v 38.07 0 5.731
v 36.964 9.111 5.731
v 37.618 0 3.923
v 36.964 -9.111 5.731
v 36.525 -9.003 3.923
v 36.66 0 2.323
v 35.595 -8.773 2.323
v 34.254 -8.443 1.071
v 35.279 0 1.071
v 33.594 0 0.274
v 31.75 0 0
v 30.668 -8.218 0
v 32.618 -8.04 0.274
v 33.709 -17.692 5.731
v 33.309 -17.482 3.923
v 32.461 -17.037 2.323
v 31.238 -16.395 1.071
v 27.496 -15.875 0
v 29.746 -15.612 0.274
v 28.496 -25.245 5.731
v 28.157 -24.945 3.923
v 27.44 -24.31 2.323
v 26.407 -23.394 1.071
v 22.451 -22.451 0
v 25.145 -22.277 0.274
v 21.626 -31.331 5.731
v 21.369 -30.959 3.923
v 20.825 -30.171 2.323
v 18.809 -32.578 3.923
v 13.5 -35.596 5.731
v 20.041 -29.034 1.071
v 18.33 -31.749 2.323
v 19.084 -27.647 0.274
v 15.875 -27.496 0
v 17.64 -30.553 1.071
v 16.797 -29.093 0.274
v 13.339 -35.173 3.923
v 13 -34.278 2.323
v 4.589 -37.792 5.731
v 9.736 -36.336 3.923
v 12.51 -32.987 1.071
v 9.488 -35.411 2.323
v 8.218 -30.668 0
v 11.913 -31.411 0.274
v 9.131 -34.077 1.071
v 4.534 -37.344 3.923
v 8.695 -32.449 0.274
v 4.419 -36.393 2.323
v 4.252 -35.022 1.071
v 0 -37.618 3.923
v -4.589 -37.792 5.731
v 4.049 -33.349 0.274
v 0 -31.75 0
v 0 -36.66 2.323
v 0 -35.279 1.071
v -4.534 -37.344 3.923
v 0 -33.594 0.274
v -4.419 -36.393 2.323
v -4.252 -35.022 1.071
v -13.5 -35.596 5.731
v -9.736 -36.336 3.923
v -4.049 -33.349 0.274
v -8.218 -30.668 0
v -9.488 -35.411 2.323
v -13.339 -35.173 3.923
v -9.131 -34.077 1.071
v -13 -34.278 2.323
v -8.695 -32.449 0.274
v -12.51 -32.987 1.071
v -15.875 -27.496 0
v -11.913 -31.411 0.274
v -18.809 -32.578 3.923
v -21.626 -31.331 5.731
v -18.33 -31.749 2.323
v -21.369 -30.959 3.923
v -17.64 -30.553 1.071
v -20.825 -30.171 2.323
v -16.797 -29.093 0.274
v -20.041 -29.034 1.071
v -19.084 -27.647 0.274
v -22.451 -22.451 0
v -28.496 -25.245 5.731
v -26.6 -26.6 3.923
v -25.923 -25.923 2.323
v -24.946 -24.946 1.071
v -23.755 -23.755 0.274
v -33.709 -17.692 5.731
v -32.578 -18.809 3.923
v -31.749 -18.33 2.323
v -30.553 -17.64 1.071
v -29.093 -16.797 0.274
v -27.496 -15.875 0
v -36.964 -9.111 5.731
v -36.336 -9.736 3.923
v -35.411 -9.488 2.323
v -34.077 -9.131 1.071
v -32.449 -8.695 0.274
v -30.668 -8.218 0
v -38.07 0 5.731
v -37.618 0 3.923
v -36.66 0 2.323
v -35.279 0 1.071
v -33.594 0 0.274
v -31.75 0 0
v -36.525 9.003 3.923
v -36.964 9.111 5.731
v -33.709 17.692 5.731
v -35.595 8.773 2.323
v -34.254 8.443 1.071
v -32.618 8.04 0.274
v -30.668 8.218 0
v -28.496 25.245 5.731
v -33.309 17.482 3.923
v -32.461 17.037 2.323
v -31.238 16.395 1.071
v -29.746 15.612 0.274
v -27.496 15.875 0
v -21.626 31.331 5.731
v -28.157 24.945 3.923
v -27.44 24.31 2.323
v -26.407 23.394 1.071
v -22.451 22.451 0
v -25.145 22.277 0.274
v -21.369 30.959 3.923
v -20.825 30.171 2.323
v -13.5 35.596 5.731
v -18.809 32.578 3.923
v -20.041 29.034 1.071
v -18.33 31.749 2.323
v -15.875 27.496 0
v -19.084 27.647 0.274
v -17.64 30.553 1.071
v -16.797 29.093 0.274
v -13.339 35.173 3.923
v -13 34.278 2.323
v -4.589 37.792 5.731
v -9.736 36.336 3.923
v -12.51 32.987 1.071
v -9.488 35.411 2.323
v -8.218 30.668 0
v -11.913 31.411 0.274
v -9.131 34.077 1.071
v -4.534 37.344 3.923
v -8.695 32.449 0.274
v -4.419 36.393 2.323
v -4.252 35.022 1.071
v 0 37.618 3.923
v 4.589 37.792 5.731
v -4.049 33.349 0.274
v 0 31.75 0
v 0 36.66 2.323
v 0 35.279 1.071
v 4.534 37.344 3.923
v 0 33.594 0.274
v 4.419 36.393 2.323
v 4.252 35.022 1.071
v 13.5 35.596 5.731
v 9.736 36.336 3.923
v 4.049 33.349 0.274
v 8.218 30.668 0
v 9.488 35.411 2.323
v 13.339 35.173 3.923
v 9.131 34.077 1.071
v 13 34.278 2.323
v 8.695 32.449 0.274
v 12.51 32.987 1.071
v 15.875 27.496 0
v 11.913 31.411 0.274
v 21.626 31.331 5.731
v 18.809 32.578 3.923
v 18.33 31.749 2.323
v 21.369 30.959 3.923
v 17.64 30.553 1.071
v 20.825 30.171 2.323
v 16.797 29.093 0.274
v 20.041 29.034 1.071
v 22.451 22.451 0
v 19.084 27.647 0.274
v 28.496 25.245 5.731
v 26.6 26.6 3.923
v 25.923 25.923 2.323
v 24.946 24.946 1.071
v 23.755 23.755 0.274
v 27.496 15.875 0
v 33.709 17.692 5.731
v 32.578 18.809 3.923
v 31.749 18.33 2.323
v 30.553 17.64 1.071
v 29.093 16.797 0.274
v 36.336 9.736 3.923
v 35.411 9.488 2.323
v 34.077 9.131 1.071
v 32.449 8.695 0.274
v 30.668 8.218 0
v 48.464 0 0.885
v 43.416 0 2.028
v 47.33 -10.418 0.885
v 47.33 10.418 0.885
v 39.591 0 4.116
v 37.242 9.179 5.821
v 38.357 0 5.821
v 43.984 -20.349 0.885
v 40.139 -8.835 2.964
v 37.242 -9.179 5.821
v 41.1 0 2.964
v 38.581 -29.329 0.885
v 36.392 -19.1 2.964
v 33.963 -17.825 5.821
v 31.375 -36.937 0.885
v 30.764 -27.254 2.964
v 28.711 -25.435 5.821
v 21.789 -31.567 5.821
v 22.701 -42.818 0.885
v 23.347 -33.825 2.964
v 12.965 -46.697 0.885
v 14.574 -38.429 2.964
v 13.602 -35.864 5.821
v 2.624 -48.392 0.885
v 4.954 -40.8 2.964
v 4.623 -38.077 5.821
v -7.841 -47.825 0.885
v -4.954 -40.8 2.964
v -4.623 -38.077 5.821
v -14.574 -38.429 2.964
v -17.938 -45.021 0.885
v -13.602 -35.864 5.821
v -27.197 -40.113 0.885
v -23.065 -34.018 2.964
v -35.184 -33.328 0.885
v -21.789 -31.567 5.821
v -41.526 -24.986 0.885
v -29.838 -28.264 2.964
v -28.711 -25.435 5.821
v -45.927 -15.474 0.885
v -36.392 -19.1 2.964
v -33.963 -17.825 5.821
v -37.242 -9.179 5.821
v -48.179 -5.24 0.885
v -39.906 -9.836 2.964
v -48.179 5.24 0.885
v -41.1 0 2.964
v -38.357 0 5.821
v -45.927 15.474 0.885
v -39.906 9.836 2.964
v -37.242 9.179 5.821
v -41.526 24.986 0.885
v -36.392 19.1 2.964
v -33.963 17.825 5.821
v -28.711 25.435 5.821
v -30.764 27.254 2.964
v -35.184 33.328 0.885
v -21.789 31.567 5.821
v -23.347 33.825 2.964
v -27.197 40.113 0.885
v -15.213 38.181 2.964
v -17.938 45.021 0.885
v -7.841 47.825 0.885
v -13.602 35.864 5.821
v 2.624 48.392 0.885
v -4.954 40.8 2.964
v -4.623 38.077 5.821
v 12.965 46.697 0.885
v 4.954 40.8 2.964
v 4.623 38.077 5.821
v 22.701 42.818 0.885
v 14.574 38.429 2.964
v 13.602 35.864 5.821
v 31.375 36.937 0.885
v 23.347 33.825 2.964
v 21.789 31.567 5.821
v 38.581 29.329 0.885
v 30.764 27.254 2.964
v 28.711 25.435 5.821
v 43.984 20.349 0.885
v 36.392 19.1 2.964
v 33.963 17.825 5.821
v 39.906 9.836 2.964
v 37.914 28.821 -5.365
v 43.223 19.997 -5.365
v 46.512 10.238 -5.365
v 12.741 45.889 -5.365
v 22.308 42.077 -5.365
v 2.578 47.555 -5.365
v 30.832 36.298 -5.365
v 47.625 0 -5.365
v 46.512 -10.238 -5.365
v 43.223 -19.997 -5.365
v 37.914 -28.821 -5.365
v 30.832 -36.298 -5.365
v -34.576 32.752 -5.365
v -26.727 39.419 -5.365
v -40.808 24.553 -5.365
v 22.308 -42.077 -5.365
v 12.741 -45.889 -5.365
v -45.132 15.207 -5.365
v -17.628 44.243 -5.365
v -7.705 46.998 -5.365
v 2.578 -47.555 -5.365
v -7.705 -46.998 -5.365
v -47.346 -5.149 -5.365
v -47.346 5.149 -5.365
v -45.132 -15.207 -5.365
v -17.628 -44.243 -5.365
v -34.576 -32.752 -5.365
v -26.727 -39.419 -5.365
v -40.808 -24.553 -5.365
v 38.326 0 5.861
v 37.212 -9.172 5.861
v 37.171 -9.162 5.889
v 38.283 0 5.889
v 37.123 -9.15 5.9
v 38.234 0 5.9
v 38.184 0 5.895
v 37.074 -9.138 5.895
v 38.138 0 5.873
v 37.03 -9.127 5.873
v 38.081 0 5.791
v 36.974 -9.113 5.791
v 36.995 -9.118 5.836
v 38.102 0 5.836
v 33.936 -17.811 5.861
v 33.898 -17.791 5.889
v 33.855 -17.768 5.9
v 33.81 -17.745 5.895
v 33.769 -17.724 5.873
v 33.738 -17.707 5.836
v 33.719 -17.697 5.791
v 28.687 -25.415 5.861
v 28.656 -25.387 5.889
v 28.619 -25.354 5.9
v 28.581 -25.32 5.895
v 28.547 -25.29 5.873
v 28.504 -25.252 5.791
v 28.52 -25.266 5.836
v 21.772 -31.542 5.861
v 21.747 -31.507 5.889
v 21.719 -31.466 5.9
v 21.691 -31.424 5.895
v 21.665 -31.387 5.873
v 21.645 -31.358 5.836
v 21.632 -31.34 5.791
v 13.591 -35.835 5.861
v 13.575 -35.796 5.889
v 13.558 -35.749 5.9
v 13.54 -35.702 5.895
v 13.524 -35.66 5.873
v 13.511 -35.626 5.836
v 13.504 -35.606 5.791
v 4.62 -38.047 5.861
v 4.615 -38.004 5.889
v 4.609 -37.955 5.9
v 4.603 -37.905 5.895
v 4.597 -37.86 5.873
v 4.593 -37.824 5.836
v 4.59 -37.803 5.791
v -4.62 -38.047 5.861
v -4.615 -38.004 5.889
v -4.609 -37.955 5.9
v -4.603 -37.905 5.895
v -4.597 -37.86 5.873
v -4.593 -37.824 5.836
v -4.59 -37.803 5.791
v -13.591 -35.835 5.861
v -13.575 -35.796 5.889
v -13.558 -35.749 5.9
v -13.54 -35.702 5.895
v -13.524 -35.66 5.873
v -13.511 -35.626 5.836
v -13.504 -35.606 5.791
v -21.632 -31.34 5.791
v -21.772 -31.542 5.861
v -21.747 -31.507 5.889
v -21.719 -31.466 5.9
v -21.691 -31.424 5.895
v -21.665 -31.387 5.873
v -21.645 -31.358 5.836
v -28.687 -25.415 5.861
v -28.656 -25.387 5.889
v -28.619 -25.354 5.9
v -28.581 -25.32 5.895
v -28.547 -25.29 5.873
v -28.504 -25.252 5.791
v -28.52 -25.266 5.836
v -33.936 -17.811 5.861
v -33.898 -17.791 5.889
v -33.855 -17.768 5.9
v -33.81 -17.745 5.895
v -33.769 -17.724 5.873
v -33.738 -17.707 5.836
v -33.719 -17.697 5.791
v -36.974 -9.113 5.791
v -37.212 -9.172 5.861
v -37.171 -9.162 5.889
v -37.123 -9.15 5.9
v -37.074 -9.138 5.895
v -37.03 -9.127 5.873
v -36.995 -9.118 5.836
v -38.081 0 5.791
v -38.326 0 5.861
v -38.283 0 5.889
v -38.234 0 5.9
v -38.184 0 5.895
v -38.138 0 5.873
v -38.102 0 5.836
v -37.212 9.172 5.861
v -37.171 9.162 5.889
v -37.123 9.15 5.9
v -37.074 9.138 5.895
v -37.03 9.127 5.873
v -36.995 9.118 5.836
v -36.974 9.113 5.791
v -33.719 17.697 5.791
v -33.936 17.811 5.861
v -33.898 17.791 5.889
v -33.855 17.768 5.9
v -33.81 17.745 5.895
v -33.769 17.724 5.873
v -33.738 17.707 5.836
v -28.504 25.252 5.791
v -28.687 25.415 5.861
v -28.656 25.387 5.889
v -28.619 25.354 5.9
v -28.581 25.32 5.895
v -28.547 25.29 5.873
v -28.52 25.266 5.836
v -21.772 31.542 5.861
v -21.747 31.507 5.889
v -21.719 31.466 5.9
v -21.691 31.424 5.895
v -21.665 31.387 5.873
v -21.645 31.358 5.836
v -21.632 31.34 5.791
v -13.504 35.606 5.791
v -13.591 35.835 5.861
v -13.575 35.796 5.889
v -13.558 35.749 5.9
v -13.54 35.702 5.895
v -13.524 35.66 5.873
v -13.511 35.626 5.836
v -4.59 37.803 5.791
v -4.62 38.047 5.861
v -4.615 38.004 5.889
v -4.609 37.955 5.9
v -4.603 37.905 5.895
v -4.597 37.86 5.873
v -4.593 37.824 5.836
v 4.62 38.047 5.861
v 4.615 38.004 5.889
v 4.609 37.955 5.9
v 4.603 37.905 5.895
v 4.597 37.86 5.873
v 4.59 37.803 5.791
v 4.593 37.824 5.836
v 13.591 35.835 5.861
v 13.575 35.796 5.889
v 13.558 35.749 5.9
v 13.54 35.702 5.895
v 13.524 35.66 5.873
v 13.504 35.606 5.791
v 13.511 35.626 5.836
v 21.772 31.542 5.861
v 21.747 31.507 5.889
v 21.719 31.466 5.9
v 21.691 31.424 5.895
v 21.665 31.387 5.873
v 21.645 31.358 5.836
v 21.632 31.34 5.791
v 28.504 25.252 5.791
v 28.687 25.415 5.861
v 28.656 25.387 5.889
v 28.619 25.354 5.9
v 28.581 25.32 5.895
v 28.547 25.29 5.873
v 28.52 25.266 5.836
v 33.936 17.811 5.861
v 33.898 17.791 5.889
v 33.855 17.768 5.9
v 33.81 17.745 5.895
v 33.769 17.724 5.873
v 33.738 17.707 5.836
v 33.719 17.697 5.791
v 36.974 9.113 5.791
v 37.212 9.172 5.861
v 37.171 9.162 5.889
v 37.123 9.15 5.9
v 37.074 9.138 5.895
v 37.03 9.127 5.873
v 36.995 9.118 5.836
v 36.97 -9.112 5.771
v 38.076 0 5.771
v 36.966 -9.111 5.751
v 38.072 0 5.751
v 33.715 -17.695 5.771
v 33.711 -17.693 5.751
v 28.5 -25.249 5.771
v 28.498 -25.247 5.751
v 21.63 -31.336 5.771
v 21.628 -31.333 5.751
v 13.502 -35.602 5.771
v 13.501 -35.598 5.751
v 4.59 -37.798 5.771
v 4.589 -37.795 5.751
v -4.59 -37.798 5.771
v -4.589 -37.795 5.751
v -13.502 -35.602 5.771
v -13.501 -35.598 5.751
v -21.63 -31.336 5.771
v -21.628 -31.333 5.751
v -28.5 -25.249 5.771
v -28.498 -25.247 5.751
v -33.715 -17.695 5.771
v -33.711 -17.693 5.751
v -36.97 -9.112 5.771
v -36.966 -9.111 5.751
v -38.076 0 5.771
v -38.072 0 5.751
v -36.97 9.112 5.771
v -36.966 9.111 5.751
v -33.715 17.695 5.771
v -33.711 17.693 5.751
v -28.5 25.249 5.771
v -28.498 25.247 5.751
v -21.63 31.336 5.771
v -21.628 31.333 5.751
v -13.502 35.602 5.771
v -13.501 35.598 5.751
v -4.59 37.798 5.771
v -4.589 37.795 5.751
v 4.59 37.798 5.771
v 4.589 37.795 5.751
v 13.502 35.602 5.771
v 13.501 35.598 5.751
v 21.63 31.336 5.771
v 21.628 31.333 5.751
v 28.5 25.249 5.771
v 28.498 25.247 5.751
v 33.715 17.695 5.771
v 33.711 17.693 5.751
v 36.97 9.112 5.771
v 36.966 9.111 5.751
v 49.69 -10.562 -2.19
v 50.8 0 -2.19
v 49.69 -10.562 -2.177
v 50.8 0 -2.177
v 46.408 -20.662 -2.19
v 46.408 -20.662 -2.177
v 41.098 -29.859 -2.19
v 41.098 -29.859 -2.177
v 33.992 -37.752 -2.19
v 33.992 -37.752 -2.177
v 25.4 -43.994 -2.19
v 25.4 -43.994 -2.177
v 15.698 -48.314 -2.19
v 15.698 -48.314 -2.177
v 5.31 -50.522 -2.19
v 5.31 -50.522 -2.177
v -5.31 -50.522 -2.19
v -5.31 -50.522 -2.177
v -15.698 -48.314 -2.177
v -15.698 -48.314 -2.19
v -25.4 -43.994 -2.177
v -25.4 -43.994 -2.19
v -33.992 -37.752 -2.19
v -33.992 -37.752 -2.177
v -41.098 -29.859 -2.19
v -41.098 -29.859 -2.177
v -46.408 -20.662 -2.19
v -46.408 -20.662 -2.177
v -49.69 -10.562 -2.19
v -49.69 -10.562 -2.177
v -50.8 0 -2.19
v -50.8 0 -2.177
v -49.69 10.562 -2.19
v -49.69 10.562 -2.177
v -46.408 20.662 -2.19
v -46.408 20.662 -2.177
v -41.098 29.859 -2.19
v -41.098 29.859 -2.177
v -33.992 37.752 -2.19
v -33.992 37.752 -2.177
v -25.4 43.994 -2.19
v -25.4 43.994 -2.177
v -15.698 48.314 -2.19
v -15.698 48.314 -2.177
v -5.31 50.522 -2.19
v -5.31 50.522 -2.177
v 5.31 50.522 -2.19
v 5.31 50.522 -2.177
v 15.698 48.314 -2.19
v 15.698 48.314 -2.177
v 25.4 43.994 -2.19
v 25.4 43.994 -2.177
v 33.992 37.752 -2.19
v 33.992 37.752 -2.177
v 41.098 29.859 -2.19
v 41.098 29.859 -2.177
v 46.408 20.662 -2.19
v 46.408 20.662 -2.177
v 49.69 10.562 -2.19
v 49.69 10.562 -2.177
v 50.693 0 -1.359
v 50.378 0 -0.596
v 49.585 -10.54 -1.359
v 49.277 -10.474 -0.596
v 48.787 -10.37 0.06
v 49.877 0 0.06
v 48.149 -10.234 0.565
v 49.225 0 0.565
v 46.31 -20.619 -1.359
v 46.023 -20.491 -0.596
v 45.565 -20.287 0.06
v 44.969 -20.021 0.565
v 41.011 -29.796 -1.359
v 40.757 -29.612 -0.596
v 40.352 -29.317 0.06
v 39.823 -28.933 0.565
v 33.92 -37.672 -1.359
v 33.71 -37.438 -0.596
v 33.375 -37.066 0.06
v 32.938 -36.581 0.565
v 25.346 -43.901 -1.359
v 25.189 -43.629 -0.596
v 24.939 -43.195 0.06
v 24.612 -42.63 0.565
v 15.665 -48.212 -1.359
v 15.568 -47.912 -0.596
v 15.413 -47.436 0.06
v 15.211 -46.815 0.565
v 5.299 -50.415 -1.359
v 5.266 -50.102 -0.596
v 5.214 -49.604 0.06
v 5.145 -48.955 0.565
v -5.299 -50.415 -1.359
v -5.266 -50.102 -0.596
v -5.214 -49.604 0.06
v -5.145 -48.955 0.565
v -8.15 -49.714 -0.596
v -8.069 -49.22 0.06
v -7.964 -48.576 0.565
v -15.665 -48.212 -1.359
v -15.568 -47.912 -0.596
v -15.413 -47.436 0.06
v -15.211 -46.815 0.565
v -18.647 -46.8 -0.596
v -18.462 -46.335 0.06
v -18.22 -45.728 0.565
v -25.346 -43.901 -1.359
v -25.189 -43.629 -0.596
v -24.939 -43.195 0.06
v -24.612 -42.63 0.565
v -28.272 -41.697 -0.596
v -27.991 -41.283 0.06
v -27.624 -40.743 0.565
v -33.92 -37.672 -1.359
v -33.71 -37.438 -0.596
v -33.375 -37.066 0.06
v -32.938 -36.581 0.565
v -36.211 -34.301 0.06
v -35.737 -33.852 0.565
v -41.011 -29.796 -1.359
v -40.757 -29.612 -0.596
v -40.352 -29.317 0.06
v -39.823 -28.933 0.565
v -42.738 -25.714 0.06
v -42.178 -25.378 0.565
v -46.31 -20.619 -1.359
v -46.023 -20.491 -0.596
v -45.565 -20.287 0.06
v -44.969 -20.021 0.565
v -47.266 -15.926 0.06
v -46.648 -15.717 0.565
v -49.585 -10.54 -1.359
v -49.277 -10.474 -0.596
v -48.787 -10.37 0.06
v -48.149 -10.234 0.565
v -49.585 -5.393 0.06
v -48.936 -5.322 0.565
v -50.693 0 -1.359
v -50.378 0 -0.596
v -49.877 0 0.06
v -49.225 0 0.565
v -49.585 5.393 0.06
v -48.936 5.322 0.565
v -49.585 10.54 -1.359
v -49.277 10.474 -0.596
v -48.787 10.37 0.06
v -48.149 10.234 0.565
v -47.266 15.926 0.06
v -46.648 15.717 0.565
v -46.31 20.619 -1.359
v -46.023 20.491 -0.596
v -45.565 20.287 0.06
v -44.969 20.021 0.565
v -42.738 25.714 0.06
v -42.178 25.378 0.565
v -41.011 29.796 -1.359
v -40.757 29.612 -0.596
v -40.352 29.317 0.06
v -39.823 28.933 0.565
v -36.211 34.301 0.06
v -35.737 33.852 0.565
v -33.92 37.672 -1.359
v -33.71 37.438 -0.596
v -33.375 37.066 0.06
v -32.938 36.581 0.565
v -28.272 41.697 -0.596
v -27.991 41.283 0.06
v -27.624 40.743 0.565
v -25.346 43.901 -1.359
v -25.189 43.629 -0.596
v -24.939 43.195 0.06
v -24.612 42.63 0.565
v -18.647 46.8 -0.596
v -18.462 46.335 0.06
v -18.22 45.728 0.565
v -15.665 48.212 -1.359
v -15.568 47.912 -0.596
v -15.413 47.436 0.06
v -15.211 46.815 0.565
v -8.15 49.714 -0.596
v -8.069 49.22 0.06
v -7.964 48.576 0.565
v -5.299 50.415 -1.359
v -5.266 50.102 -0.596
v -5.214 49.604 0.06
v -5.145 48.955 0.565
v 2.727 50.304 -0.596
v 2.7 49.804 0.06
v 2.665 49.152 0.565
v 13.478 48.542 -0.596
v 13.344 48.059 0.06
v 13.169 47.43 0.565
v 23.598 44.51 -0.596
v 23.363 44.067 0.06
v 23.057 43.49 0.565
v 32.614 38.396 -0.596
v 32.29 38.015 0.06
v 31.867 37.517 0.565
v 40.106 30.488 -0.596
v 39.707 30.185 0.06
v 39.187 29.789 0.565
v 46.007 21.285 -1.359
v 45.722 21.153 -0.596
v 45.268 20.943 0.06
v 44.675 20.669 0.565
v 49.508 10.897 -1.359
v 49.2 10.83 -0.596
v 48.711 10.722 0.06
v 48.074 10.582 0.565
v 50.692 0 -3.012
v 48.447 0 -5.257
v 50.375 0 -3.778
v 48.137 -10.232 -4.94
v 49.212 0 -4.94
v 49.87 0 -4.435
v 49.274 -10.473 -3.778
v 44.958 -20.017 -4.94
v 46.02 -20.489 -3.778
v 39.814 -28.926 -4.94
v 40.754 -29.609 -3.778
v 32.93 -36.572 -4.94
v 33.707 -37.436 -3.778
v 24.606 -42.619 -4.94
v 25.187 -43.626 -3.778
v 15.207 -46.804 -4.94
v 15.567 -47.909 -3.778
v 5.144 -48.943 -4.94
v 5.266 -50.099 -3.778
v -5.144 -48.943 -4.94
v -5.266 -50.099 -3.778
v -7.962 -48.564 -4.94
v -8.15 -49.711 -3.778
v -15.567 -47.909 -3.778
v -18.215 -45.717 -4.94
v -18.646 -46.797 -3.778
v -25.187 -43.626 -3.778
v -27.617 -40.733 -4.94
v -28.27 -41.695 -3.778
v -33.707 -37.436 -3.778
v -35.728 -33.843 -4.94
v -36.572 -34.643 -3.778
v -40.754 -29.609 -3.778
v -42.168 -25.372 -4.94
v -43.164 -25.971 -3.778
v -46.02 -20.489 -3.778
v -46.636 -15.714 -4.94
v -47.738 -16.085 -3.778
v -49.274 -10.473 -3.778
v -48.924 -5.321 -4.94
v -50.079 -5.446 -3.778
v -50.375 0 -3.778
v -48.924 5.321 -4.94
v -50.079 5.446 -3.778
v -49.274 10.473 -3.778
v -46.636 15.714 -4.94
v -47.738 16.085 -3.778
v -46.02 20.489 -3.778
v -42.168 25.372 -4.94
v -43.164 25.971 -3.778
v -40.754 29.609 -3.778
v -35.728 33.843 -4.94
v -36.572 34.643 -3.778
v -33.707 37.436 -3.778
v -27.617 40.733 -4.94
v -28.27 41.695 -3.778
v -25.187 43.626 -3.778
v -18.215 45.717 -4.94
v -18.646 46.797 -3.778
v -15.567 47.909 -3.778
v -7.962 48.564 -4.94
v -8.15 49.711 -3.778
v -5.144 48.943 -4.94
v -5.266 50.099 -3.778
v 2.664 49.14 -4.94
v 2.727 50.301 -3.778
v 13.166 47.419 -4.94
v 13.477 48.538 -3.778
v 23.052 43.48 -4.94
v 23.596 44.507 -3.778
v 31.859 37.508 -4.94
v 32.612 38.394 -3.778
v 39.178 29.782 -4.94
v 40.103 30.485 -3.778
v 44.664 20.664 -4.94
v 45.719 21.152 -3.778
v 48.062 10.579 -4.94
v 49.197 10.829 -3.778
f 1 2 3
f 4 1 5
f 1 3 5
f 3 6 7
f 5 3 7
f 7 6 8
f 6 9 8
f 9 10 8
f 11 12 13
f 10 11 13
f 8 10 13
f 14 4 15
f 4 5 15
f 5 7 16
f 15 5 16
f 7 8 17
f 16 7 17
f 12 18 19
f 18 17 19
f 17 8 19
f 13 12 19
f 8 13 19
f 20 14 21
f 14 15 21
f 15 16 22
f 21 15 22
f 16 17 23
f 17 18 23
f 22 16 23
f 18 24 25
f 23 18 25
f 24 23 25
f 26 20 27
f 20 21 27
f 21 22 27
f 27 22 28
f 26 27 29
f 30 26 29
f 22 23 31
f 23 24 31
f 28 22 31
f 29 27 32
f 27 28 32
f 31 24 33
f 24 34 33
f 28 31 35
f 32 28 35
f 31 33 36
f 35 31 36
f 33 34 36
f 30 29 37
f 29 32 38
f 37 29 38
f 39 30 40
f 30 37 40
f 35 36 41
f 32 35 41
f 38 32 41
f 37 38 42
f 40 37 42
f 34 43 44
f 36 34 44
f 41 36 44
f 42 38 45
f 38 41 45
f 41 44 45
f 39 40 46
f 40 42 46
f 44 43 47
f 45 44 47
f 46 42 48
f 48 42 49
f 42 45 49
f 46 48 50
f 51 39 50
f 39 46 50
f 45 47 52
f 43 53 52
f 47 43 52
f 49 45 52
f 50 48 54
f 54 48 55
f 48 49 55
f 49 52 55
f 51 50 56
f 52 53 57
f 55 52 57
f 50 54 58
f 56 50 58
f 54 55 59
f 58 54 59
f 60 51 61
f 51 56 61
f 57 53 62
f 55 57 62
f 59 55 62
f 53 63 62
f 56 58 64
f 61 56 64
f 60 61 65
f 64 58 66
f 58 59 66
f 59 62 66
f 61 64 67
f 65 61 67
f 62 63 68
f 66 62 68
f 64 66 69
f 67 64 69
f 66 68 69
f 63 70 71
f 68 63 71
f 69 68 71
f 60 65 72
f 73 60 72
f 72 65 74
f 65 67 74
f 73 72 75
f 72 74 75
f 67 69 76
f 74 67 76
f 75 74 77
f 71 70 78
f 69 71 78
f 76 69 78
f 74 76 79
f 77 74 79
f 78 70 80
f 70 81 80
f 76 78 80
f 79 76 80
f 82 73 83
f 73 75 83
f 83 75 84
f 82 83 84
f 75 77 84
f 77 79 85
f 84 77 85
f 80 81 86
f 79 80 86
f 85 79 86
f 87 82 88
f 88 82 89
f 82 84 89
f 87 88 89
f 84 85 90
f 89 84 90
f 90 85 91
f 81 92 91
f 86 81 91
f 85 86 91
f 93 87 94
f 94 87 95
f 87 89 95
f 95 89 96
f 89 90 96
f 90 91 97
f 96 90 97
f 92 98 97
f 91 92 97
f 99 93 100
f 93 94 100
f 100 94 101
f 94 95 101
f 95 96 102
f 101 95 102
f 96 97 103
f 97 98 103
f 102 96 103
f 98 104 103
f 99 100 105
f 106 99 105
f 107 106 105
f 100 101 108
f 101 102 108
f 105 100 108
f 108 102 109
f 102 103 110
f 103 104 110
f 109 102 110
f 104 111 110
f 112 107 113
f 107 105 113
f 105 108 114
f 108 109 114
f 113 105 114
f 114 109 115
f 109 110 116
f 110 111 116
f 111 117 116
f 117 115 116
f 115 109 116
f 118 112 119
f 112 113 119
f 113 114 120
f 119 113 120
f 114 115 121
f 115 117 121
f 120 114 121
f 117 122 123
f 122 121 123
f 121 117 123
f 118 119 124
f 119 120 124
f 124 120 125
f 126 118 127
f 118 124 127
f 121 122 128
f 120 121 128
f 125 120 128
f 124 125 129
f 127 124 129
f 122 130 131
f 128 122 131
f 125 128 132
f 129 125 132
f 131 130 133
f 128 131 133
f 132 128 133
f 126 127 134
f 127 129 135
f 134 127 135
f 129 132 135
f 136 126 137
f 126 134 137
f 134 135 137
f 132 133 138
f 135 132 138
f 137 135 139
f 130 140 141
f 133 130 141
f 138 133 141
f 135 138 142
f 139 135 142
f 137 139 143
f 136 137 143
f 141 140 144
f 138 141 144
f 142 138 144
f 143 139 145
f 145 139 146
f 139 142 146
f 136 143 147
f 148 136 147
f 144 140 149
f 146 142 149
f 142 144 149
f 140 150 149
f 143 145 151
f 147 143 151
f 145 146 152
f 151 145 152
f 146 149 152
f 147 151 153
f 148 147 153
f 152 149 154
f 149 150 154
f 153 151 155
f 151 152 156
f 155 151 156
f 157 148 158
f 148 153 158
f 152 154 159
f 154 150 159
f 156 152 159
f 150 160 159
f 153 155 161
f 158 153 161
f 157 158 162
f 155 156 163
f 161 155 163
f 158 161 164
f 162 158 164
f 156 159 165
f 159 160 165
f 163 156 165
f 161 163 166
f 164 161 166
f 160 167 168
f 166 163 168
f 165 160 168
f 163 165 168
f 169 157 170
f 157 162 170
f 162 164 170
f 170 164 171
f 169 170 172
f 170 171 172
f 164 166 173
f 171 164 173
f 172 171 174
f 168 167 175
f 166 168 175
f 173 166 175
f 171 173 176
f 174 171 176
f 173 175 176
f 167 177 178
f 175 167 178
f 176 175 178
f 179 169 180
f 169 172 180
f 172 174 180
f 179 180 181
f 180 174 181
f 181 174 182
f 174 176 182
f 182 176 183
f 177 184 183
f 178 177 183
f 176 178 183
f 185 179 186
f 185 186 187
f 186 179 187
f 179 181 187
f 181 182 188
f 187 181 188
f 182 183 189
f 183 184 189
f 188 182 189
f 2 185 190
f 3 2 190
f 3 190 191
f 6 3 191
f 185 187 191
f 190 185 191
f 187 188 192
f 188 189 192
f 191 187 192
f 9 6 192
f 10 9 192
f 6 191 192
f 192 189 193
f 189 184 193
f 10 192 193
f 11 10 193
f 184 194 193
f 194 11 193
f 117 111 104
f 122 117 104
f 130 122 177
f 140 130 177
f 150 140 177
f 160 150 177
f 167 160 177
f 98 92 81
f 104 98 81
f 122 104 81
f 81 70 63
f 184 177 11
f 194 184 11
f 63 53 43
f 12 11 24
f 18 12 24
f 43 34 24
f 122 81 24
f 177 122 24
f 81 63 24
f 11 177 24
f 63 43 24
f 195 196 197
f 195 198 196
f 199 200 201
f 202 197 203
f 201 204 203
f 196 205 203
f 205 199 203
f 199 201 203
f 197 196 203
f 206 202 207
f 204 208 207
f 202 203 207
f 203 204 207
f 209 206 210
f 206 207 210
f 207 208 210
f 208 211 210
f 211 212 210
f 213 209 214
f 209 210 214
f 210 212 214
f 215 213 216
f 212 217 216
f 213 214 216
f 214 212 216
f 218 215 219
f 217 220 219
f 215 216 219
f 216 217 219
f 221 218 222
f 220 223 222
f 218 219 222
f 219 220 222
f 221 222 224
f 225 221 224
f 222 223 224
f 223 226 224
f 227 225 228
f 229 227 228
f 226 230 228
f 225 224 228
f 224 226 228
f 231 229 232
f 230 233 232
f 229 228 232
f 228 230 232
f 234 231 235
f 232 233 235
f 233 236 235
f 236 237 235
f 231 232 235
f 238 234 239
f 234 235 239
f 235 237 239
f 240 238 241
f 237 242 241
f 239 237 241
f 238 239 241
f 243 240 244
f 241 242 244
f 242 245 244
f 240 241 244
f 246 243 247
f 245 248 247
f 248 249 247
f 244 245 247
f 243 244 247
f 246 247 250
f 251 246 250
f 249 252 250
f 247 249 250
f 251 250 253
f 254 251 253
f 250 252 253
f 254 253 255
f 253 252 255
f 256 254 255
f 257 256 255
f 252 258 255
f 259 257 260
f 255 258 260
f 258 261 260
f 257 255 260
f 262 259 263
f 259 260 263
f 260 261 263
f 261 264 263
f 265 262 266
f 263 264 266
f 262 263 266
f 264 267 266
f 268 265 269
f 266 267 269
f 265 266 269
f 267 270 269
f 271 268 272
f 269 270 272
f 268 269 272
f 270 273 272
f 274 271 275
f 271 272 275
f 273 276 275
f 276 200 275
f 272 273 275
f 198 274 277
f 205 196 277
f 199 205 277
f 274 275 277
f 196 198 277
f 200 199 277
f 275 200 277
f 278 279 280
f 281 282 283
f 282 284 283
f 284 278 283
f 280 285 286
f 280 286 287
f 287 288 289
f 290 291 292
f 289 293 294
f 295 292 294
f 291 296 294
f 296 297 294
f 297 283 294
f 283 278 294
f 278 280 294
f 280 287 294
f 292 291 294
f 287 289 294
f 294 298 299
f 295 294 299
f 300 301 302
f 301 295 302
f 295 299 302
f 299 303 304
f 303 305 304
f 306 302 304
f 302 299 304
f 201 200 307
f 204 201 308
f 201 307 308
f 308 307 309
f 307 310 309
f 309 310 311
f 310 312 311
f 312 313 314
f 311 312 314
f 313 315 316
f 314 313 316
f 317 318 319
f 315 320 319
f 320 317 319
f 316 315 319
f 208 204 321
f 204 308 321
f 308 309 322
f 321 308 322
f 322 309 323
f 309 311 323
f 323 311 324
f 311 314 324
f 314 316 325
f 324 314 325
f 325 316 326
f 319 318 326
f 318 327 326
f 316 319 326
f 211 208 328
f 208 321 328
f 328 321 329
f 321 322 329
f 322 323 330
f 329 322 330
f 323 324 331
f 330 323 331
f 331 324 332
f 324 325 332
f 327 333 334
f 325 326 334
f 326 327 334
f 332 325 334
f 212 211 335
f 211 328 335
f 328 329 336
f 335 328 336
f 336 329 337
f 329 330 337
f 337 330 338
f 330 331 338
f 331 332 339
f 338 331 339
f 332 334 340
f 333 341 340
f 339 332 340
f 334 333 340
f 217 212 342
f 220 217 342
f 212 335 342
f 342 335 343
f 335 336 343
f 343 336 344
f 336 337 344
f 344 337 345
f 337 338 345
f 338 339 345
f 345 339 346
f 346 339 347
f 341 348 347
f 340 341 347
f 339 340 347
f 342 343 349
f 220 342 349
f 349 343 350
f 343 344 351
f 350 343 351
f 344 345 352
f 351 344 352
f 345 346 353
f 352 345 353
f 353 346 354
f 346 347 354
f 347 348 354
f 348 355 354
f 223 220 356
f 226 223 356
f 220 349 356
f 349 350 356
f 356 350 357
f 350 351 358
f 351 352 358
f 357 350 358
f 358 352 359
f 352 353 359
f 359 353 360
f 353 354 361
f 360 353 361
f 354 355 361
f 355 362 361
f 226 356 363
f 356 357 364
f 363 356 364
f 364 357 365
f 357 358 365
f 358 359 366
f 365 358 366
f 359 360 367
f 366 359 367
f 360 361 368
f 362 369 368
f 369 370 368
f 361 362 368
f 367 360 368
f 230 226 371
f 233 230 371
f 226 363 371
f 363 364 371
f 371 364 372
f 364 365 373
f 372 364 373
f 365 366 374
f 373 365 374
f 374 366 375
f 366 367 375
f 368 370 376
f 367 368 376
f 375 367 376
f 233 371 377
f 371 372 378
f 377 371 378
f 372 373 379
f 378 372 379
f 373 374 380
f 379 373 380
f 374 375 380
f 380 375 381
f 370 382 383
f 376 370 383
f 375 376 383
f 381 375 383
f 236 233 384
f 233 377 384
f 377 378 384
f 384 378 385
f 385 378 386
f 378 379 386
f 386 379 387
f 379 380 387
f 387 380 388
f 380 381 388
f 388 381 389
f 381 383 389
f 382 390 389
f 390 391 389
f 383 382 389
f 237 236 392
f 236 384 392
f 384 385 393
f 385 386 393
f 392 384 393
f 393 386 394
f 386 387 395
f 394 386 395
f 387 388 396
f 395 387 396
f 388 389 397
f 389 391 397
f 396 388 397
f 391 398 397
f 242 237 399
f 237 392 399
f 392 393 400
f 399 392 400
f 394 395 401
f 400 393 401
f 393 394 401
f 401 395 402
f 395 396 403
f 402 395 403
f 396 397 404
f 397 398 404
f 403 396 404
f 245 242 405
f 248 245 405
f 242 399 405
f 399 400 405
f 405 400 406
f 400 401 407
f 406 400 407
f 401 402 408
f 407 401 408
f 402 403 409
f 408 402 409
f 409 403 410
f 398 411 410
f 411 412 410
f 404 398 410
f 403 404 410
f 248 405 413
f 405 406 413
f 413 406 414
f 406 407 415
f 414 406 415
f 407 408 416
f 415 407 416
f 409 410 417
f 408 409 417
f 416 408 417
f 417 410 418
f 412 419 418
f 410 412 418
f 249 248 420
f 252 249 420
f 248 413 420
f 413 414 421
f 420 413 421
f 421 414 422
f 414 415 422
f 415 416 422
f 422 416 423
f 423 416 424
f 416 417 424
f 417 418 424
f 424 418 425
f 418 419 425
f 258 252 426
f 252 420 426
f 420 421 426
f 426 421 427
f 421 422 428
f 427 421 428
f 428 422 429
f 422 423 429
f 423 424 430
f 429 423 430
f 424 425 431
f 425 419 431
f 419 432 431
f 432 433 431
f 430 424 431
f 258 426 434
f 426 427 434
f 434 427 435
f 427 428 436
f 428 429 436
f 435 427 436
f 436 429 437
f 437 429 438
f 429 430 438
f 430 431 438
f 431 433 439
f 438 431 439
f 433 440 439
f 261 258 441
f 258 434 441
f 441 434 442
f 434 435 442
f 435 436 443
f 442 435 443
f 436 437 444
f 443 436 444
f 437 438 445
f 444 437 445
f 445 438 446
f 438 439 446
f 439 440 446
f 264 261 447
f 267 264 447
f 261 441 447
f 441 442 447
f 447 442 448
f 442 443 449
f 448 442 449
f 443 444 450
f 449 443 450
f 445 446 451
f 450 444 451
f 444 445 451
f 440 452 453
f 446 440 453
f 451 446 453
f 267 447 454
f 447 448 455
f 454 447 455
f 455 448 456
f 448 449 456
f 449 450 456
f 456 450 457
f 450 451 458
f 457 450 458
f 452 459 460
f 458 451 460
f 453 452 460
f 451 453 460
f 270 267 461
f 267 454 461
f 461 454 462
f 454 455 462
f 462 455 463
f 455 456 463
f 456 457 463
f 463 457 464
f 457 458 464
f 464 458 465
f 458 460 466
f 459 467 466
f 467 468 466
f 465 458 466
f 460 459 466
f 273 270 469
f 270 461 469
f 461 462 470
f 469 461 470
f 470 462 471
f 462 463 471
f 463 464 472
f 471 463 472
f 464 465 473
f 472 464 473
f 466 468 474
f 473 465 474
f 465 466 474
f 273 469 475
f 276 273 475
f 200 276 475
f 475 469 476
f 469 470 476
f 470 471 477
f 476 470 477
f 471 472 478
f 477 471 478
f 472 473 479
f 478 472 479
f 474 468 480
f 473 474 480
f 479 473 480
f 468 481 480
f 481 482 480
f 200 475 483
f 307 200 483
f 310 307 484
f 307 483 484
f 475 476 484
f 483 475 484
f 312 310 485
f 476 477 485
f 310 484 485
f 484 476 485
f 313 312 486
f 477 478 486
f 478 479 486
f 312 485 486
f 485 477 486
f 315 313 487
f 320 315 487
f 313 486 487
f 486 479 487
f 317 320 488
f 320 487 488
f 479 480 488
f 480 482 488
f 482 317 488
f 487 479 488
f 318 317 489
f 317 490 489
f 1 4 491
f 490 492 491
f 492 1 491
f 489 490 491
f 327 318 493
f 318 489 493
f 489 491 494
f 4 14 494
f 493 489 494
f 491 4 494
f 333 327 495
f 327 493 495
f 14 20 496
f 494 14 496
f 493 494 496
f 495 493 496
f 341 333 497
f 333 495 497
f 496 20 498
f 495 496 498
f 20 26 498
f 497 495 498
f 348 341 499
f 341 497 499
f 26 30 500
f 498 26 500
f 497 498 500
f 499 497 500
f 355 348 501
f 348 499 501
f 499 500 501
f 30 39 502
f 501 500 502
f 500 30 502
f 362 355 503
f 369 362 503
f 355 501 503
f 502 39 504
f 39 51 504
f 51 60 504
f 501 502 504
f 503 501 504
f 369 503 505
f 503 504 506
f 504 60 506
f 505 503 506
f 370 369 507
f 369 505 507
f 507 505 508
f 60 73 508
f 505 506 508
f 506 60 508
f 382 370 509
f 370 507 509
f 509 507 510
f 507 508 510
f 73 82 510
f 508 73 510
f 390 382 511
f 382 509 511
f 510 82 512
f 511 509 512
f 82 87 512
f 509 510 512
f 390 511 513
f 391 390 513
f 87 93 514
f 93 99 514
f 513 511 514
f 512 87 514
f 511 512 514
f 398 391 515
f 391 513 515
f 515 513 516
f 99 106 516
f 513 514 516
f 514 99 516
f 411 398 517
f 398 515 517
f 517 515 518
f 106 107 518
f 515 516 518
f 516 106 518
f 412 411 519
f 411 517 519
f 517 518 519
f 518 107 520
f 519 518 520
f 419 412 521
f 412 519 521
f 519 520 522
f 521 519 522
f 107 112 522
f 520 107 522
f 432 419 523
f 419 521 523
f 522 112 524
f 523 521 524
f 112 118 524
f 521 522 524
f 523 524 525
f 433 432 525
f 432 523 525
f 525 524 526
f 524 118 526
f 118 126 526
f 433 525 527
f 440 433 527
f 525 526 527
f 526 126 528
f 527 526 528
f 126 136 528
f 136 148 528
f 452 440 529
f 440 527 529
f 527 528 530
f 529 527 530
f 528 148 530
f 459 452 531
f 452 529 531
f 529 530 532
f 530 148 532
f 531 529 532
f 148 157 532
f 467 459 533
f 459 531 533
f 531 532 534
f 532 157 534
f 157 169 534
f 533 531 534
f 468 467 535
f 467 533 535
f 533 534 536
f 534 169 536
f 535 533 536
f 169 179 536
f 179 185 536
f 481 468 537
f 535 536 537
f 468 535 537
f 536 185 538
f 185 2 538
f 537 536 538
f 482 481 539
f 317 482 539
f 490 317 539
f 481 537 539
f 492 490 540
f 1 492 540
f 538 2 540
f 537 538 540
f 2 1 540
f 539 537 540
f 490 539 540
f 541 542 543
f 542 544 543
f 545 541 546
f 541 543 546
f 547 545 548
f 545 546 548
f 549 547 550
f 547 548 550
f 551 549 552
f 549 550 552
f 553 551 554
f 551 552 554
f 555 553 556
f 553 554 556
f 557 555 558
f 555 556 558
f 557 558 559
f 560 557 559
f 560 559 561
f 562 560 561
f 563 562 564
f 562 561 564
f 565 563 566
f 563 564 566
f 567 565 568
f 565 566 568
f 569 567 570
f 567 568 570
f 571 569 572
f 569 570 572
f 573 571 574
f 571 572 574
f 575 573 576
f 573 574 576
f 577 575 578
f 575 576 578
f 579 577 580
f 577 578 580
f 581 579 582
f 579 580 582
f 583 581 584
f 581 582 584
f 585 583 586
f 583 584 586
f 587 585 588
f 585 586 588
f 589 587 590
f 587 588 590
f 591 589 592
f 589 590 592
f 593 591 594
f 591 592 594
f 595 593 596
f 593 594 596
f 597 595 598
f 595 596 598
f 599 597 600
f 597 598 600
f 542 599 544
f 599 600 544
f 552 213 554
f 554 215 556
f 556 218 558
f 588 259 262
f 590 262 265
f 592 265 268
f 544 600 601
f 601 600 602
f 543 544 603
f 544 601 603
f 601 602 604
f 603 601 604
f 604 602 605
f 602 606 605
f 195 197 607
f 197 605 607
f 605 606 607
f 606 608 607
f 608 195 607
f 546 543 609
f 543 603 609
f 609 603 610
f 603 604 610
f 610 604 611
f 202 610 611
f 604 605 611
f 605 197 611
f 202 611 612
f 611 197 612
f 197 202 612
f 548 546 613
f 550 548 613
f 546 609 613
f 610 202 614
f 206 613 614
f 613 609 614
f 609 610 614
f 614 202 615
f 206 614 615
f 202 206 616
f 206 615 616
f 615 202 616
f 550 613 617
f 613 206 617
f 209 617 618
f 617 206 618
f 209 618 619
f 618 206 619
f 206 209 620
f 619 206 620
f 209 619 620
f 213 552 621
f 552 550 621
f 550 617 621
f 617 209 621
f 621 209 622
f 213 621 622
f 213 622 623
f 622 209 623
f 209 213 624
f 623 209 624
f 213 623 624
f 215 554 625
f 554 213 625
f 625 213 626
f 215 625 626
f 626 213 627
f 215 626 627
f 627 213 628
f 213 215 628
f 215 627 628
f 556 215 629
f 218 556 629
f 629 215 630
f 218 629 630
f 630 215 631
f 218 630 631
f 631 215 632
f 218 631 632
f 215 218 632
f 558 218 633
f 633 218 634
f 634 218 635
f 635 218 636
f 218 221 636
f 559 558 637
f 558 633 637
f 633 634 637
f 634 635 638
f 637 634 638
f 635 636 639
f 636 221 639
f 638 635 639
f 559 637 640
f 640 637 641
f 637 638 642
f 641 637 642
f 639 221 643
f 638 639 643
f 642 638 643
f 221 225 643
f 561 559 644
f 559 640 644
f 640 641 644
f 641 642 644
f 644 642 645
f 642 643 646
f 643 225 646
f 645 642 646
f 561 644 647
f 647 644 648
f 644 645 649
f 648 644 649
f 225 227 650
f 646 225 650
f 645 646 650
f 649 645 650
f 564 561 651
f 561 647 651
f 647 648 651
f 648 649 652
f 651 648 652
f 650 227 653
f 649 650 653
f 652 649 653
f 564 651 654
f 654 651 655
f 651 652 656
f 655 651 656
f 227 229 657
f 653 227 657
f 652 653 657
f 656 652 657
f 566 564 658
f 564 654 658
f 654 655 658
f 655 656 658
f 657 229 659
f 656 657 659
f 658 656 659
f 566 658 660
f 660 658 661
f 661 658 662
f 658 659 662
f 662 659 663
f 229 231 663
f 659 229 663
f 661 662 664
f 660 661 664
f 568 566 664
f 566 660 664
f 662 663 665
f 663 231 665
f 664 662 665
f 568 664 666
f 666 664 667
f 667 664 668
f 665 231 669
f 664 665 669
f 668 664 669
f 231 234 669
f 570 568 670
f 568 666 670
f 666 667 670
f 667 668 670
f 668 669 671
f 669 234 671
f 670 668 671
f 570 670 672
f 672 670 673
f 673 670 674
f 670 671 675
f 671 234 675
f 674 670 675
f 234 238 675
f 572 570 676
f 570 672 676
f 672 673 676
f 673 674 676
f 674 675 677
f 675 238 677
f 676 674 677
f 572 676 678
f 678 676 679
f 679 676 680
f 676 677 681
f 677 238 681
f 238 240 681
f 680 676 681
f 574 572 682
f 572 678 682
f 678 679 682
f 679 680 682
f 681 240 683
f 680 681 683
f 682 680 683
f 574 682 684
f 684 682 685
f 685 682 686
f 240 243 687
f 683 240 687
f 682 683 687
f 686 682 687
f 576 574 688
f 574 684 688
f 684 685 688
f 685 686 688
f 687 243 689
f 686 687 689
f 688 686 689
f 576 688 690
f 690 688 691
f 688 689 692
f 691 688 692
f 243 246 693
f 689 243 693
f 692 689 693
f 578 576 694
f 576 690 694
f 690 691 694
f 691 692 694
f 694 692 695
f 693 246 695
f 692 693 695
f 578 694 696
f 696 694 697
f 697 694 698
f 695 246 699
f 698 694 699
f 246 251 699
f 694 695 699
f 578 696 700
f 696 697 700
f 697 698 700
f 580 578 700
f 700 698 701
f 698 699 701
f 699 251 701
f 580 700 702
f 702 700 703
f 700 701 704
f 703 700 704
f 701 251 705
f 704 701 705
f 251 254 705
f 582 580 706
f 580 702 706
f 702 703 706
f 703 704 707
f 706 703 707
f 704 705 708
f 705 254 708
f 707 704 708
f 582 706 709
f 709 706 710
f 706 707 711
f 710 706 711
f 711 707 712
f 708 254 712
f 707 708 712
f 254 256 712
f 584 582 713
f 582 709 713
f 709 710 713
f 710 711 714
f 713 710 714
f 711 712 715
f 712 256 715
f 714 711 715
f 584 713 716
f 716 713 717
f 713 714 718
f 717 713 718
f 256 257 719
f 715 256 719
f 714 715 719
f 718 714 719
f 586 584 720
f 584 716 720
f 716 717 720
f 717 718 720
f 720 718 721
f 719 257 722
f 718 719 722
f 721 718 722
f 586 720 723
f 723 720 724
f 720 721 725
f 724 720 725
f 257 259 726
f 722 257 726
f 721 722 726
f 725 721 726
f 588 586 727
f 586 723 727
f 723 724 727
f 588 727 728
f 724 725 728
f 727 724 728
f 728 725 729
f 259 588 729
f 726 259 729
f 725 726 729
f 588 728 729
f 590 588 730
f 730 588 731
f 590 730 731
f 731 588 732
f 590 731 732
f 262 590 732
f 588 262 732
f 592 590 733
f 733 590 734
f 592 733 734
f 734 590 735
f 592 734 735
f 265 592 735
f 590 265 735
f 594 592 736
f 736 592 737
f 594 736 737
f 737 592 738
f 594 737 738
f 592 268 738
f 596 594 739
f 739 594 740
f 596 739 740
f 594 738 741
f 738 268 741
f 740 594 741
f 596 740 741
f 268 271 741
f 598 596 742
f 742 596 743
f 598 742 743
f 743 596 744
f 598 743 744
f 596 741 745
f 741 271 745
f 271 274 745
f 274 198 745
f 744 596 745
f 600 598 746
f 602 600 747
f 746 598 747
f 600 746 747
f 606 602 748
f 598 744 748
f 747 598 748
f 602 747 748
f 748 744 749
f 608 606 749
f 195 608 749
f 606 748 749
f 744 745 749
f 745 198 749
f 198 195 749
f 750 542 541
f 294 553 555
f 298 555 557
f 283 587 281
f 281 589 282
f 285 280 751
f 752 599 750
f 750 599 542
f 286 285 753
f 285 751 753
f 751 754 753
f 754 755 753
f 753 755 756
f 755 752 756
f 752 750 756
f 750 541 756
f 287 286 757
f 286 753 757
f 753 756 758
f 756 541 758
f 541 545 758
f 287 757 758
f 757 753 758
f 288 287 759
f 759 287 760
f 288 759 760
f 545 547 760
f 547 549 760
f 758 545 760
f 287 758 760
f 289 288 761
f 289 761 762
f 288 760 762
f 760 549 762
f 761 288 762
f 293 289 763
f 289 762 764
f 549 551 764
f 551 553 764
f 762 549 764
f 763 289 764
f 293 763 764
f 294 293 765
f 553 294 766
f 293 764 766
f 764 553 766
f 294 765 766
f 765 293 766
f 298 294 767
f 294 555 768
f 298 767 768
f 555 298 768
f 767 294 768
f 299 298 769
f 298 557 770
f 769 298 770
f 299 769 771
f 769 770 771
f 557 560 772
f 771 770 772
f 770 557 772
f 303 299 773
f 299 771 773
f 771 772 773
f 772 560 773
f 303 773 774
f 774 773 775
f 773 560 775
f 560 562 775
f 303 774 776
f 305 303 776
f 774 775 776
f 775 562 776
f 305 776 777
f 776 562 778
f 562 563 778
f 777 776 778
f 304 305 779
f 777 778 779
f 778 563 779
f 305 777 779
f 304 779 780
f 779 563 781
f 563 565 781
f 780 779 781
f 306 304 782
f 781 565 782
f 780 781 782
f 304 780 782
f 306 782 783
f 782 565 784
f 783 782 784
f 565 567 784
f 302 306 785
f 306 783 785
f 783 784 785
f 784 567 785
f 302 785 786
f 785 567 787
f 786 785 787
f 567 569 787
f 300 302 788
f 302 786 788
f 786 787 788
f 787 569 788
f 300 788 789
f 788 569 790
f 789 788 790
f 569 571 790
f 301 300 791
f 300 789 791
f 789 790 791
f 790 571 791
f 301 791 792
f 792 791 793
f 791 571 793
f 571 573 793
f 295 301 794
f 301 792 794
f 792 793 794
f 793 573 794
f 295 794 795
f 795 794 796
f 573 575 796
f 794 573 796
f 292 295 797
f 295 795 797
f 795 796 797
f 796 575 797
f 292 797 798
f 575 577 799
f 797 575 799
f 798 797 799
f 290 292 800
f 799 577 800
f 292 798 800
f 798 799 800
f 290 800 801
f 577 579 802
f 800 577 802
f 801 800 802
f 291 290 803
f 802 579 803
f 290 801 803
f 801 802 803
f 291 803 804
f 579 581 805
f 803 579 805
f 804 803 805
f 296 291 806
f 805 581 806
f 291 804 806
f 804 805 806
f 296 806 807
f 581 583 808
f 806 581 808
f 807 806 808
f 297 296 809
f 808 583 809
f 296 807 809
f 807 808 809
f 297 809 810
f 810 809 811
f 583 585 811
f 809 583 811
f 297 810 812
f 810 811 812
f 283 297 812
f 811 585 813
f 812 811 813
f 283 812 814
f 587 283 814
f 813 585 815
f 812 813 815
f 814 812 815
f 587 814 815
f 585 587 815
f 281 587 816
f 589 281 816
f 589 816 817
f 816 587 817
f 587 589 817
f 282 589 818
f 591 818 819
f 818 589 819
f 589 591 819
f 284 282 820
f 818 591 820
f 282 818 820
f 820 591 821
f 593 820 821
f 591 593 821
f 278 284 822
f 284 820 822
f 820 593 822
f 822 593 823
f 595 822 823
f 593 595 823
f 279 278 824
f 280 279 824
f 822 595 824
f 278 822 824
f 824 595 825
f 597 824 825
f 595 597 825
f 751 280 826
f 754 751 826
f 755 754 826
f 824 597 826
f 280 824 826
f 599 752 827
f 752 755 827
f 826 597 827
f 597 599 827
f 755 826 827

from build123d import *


with BuildPart() as f2:
    # F1 (on Front) → F2 (revolve)
    with BuildSketch(Plane.XZ):
        with BuildLine():
            ThreePointArc((38.069789, 5.731313), (36.015785, 1.646216), (31.75, 0))
            Line((31.75, 0), (0, 0))
            Line((0, 0), (0, -5.365094))
            Line((0, -5.365094), (47.625, -5.365094))
            ThreePointArc((47.625, -5.365094), (49.870064, -4.435158), (50.8, -2.190094))
            Line((50.8, -2.190094), (50.8, -2.177424))
            ThreePointArc((50.8, -2.177424), (50.14917, -0.251498), (48.463503, 0.884853))
            add(Edge.make_bspline(
                [(48.463503, 0.884853), (44.722084, 1.909317), (40.504035, 1.759242), (38.357007, 5.820869)],
                knots=[2.442821, 2.442821, 2.442821, 2.442821, 13.729517, 13.729517, 13.729517, 13.729517], degree=3))
            ThreePointArc((38.357007, 5.820869), (38.208545, 5.89959), (38.080714, 5.790514))
            ThreePointArc((38.080714, 5.790514), (38.073994, 5.761146), (38.069789, 5.731313))
        make_face()
    revolve(axis=Axis((0, 0, -2.682547), (0, 0, -1)))


solid = f2.part
